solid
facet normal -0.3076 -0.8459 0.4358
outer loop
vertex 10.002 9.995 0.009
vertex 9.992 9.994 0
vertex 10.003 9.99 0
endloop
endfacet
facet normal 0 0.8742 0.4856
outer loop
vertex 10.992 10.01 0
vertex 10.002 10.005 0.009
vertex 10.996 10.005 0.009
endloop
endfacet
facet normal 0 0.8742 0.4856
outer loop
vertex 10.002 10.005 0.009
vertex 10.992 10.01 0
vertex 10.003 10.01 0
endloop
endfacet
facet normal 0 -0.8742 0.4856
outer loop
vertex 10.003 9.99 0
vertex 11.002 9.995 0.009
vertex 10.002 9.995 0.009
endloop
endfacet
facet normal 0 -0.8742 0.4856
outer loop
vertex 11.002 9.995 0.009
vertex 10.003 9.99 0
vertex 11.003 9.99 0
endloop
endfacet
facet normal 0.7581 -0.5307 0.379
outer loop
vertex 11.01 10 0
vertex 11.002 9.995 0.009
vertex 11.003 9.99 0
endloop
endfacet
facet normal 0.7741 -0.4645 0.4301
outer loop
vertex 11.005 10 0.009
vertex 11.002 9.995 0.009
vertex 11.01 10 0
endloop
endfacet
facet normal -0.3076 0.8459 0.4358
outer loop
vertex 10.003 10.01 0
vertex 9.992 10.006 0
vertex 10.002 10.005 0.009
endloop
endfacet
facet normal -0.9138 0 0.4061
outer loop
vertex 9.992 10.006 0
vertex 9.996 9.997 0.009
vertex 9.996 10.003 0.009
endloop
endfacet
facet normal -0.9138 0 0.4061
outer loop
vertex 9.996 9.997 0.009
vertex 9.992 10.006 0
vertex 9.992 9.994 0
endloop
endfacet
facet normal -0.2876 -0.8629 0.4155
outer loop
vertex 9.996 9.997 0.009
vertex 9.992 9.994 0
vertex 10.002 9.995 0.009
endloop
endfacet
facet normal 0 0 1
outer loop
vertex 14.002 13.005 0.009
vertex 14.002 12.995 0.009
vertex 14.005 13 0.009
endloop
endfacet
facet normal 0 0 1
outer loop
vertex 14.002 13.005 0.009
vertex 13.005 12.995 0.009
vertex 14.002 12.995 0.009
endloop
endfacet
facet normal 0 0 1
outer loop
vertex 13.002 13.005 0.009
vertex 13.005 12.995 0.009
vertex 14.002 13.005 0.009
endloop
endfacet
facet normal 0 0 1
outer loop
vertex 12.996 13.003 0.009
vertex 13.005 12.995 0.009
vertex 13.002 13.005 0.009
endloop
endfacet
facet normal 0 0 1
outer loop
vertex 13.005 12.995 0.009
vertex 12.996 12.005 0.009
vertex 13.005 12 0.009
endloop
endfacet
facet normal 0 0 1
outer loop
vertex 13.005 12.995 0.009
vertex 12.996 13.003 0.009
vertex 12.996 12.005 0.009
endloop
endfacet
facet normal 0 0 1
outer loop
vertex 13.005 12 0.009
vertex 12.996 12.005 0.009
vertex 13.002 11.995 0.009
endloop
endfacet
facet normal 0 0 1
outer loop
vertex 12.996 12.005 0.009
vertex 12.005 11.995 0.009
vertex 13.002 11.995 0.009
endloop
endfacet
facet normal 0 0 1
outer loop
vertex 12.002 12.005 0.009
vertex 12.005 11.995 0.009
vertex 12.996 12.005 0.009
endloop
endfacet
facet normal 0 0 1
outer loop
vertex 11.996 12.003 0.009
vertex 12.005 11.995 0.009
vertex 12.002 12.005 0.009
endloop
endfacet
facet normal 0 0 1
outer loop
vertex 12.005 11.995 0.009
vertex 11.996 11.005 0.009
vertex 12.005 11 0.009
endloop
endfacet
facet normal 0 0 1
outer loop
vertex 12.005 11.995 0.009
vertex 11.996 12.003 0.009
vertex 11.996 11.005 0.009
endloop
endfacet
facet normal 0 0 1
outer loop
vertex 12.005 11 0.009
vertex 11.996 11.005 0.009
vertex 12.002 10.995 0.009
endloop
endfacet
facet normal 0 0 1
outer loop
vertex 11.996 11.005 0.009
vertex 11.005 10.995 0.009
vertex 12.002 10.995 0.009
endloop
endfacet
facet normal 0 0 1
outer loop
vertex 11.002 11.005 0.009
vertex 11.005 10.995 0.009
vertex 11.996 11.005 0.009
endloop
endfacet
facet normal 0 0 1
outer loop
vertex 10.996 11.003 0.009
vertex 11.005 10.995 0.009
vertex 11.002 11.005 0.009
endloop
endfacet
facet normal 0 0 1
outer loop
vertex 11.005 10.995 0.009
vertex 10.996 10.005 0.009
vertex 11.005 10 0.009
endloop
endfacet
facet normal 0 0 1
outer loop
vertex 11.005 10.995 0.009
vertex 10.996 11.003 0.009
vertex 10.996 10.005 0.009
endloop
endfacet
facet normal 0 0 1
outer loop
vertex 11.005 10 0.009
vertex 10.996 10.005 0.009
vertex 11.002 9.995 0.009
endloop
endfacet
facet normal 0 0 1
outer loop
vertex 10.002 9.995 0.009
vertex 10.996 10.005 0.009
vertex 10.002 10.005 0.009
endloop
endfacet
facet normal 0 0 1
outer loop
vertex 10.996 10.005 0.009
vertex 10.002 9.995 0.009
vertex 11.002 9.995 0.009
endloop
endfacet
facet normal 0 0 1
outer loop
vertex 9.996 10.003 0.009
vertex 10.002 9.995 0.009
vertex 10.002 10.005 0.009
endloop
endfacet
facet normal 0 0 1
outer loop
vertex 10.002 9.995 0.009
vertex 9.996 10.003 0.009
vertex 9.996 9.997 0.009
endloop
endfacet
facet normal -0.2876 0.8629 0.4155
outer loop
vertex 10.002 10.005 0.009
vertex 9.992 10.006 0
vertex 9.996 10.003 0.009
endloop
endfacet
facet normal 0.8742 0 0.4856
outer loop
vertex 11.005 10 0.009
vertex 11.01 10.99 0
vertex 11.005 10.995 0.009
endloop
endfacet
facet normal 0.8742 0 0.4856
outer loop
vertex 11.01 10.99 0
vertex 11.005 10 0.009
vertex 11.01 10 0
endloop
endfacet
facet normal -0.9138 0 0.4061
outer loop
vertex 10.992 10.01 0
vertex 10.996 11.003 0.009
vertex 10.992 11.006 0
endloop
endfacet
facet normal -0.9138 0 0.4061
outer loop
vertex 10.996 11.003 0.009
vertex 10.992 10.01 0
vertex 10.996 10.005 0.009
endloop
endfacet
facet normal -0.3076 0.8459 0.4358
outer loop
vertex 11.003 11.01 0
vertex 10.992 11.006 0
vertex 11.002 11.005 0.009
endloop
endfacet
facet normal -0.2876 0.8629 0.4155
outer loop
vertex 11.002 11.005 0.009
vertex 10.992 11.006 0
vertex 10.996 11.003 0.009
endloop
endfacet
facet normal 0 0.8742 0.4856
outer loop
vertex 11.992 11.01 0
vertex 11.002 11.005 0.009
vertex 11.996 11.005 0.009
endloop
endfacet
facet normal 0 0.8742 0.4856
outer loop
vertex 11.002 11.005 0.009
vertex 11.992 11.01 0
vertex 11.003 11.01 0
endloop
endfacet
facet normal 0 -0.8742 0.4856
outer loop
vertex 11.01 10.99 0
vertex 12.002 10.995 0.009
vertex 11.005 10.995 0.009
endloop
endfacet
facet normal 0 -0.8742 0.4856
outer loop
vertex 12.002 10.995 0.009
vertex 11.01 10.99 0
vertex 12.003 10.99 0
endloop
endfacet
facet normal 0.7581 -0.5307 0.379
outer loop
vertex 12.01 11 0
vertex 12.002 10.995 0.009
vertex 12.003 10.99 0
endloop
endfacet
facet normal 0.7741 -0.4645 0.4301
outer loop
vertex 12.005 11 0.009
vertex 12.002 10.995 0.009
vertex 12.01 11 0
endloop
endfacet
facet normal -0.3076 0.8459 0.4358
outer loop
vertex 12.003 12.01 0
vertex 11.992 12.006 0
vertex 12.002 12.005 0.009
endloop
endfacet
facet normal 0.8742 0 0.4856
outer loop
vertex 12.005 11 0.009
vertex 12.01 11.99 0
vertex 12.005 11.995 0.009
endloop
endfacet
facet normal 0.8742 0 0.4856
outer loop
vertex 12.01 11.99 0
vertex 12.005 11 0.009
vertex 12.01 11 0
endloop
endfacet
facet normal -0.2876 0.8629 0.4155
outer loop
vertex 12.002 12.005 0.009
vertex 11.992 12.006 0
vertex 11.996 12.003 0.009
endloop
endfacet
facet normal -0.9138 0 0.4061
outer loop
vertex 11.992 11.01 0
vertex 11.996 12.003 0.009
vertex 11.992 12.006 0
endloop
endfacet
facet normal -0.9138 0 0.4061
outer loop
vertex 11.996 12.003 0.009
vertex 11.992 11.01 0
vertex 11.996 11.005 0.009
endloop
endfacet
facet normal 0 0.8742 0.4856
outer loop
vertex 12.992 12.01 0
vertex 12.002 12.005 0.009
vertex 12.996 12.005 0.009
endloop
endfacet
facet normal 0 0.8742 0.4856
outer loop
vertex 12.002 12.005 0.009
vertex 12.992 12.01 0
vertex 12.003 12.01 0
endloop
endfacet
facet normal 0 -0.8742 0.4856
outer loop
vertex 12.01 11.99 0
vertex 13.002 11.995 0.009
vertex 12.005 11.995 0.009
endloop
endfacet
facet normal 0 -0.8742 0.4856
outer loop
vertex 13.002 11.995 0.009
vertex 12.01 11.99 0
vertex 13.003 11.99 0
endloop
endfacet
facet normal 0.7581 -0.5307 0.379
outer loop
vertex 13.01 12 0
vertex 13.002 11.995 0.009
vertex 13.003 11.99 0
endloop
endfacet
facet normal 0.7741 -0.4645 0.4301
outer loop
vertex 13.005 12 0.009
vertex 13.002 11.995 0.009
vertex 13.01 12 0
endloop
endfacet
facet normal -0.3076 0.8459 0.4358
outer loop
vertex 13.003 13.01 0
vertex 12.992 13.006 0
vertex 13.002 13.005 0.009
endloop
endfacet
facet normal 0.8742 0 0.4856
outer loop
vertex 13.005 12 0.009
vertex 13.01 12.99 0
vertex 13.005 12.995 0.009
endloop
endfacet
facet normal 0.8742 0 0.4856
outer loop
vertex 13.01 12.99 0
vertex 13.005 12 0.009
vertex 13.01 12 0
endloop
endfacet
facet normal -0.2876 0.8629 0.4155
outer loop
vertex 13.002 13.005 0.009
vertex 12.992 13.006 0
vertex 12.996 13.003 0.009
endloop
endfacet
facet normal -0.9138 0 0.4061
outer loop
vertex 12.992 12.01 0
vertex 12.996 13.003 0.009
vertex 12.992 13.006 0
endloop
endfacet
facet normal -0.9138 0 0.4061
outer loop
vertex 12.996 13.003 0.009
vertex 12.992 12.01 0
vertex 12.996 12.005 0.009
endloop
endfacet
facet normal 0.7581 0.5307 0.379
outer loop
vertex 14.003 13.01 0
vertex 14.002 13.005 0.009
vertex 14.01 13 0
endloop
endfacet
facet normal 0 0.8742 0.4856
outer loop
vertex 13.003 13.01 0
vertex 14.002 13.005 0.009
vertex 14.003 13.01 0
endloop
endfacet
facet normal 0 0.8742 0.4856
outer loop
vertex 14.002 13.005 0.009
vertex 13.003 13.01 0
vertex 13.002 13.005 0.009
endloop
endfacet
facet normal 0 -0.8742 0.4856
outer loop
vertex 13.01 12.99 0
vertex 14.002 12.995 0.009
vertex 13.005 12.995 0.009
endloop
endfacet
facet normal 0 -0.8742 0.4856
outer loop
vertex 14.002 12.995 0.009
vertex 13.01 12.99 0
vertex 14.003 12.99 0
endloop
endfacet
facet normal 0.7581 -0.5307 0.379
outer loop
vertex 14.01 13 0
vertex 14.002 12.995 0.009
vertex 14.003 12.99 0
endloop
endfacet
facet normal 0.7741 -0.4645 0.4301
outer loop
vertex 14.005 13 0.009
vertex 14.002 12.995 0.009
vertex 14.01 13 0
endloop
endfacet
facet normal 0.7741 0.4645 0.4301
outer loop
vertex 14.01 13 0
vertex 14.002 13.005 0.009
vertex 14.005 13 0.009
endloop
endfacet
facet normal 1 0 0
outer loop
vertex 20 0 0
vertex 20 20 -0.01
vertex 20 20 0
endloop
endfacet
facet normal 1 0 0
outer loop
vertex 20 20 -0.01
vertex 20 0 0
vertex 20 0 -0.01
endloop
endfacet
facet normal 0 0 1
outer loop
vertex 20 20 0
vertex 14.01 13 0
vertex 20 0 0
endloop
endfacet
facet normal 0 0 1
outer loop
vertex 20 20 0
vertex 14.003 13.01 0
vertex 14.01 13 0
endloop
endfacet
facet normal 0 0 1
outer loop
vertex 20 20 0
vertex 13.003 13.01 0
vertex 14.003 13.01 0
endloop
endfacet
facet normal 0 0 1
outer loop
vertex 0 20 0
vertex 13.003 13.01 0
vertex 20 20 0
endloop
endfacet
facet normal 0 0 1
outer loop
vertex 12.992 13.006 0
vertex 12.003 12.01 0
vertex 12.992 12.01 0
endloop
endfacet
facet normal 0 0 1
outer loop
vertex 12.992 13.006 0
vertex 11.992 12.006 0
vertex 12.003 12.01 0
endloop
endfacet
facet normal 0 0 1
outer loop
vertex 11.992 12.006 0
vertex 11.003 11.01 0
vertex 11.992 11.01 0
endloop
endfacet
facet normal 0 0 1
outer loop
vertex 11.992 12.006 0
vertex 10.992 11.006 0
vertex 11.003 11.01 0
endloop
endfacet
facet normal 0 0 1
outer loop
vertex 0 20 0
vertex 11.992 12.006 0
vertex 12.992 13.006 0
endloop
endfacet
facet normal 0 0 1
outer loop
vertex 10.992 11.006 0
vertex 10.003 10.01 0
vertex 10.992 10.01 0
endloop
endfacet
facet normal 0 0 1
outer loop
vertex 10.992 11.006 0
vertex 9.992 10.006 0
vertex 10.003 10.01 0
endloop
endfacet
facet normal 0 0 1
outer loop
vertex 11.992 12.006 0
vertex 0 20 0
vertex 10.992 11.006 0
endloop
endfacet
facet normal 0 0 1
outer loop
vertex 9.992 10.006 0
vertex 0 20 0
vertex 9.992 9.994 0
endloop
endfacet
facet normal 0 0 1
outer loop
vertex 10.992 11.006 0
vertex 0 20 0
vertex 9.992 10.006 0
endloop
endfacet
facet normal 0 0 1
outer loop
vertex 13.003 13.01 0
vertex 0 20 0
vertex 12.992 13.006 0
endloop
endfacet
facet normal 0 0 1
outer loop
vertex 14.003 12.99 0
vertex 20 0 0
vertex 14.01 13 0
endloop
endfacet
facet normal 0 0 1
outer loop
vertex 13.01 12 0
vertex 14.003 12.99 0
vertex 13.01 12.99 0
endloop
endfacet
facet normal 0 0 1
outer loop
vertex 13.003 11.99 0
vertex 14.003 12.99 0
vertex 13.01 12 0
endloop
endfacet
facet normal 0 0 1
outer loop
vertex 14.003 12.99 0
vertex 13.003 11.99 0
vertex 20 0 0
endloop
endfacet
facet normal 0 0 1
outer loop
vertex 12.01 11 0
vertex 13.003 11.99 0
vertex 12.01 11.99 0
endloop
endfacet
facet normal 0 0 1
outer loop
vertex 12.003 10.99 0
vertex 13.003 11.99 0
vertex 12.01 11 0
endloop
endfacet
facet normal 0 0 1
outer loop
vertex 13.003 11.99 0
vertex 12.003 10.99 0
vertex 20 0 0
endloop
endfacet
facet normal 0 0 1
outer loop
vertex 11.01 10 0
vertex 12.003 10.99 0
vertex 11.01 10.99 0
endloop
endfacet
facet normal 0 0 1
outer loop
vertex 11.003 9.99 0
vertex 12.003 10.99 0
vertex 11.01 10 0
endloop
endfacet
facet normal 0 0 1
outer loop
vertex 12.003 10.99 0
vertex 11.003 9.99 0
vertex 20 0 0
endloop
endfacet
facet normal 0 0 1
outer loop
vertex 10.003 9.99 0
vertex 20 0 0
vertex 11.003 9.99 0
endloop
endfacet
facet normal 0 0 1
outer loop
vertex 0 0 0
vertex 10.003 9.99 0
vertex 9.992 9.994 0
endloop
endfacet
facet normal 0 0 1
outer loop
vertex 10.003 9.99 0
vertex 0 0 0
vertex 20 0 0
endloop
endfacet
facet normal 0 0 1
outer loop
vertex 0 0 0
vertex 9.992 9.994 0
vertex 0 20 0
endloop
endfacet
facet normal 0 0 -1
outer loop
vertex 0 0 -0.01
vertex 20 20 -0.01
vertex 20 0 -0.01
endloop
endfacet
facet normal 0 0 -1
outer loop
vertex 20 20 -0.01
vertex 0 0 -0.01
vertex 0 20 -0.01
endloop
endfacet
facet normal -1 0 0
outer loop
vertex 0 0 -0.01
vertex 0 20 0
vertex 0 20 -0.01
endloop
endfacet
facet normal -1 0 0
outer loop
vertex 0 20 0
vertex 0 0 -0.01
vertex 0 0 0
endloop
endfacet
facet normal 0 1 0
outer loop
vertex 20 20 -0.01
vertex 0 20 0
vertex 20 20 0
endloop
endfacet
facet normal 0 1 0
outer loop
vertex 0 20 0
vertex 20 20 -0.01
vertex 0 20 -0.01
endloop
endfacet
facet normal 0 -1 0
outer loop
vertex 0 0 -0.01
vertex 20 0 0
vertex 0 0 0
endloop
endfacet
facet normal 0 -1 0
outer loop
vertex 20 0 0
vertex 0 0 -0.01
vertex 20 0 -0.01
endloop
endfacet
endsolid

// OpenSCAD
hull(){
    translate([10.0, 10.0]) sphere(0.01);
    translate([11.0, 10.0]) sphere(0.01);
}
hull(){
    translate([11.0, 10.0]) sphere(0.01);
    translate([11.0, 11.0]) sphere(0.01);
}
hull(){
    translate([11.0, 11.0]) sphere(0.01);
    translate([12.0, 11.0]) sphere(0.01);
}
hull(){
    translate([12.0, 11.0]) sphere(0.01);
    translate([12.0, 12.0]) sphere(0.01);
}
hull(){
    translate([12.0, 12.0]) sphere(0.01);
    translate([13.0, 12.0]) sphere(0.01);
}
hull(){
    translate([13.0, 12.0]) sphere(0.01);
    translate([13.0, 13.0]) sphere(0.01);
}
hull(){
    translate([13.0, 13.0]) sphere(0.01);
    translate([14.0, 13.0]) sphere(0.01);
}
translate([0,0,-0.01]) color([0.1,0.1,0.1]) cube([20,20,0.01]);
